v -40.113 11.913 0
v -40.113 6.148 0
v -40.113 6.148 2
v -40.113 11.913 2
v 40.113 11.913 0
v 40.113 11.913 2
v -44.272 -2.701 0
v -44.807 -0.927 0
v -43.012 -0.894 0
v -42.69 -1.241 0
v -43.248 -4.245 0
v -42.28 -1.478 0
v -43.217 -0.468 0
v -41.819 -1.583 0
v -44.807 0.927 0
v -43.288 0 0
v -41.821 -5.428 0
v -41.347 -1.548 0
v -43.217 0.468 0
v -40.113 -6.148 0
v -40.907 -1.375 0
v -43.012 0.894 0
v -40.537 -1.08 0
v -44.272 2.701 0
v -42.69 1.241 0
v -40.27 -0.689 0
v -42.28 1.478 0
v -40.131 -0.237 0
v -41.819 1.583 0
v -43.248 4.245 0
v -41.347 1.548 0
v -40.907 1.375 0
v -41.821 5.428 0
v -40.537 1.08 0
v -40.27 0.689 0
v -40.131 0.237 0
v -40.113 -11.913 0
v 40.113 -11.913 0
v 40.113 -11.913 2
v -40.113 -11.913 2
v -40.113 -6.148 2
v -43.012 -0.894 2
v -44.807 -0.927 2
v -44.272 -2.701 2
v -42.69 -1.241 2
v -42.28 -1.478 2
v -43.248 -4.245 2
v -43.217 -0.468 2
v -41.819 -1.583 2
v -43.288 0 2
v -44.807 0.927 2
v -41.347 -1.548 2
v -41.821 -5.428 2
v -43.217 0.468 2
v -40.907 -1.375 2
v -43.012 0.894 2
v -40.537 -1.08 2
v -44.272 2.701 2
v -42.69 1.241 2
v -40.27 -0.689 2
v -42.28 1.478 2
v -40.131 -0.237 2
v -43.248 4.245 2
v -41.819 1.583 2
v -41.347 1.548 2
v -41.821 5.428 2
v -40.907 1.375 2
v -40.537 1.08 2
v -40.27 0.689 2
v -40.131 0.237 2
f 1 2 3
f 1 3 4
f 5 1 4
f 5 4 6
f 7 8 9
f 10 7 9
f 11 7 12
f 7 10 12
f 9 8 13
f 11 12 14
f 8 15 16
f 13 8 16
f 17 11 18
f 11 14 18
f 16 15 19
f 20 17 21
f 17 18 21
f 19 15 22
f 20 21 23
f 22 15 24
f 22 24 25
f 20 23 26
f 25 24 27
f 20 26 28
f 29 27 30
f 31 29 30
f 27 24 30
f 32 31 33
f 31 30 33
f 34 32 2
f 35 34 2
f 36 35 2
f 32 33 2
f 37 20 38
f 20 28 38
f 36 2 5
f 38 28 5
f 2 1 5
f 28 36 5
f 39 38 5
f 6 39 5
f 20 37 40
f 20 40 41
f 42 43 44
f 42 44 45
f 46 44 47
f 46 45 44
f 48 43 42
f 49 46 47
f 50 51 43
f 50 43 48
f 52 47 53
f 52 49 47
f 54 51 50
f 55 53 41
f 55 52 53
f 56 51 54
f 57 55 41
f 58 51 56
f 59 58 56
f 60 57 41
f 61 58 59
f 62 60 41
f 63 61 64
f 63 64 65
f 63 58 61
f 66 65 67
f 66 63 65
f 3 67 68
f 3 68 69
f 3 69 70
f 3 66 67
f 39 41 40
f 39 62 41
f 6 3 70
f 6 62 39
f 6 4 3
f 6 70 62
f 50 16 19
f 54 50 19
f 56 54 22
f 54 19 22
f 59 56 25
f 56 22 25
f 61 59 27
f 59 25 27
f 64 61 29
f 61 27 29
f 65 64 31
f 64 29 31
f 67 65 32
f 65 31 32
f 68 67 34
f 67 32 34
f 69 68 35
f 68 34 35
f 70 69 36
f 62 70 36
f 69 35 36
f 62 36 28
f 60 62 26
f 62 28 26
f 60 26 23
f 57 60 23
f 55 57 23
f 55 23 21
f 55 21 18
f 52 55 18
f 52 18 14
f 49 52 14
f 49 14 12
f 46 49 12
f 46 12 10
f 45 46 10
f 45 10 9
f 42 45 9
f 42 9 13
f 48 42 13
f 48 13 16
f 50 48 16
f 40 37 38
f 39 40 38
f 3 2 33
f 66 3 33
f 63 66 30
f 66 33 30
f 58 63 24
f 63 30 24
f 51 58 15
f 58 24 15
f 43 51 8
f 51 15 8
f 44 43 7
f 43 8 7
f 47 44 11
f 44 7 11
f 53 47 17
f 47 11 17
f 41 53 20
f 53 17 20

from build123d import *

# Parameters (mm, degrees)
SKETCH2_R           = 6.35
SKETCH2_W           = 80.2259
SKETCH2_H           = 23.8252
SKETCH2_W_2         = 77.0509
SKETCH2_H_2         = 20.6502
BOSS_EXTRUDE1_DEPTH = 2
SKETCH5_R           = 1.5875
CUT_EXTRUDE1_DEPTH  = 2.54


with BuildPart() as part:
    # Sketch2 → Boss-Extrude1 (new body)
    # profile 1 of 7: a face of its own
    with BuildSketch(Plane.XY):
        with BuildLine():
            Line((-40.11295, -6.148361062), (-40.11295, 6.148361062))
            ThreePointArc((-40.11295, 6.148361062), (-44.87545, 0), (-40.11295, -6.148361062))
        make_face()
    # profile 2 of 7: a face of its own
    with BuildSketch(Plane.XY):
        with BuildLine():
            Line((-38.52545, -6.35), (-38.52545, 6.35))
            ThreePointArc((-38.52545, 6.35), (-39.325577257, 6.299388571), (-40.11295, 6.148361062))
            Line((-40.11295, 6.148361062), (-40.11295, -6.148361062))
            ThreePointArc((-40.11295, -6.148361062), (-39.325577257, -6.299388571), (-38.52545, -6.35))
        make_face()
    # profile 3 of 7: a face of its own
    with BuildSketch(Plane.XY):
        with Locations((-38.52545, 0)):
            Circle(SKETCH2_R)
    # profile 4 of 7: a face of its own
    with BuildSketch(Plane.XY):
        with Locations((-38.52545, 0)):
            Circle(SKETCH2_R)
    # profile 5 of 7: a face of its own
    with BuildSketch(Plane.XY):
        Rectangle(SKETCH2_W, SKETCH2_H)
        Rectangle(SKETCH2_W_2, SKETCH2_H_2, mode=Mode.SUBTRACT)
    # profile 6 of 7: a face of its own
    with BuildSketch(Plane.XY):
        Rectangle(SKETCH2_W_2, SKETCH2_H_2)
    # profile 7 of 7: a face of its own
    with BuildSketch(Plane.XY):
        with BuildLine():
            ThreePointArc((-32.17545, 0), (-34.035321939, 4.490128061), (-38.52545, 6.35))
            Line((-38.52545, 6.35), (-38.52545, -6.35))
            ThreePointArc((-38.52545, -6.35), (-34.035321939, -4.490128061), (-32.17545, 0))
        make_face()
    extrude(amount=BOSS_EXTRUDE1_DEPTH)

    # Sketch5 → Cut-Extrude1 (cut)
    with BuildSketch(Plane(origin=(0, 0, 0), x_dir=(-1, 0, 0), z_dir=(0, 0, -1))):
        with Locations((41.70045, 0)):
            Circle(SKETCH5_R)
    extrude(amount=-CUT_EXTRUDE1_DEPTH, mode=Mode.SUBTRACT)


solid = part.part
